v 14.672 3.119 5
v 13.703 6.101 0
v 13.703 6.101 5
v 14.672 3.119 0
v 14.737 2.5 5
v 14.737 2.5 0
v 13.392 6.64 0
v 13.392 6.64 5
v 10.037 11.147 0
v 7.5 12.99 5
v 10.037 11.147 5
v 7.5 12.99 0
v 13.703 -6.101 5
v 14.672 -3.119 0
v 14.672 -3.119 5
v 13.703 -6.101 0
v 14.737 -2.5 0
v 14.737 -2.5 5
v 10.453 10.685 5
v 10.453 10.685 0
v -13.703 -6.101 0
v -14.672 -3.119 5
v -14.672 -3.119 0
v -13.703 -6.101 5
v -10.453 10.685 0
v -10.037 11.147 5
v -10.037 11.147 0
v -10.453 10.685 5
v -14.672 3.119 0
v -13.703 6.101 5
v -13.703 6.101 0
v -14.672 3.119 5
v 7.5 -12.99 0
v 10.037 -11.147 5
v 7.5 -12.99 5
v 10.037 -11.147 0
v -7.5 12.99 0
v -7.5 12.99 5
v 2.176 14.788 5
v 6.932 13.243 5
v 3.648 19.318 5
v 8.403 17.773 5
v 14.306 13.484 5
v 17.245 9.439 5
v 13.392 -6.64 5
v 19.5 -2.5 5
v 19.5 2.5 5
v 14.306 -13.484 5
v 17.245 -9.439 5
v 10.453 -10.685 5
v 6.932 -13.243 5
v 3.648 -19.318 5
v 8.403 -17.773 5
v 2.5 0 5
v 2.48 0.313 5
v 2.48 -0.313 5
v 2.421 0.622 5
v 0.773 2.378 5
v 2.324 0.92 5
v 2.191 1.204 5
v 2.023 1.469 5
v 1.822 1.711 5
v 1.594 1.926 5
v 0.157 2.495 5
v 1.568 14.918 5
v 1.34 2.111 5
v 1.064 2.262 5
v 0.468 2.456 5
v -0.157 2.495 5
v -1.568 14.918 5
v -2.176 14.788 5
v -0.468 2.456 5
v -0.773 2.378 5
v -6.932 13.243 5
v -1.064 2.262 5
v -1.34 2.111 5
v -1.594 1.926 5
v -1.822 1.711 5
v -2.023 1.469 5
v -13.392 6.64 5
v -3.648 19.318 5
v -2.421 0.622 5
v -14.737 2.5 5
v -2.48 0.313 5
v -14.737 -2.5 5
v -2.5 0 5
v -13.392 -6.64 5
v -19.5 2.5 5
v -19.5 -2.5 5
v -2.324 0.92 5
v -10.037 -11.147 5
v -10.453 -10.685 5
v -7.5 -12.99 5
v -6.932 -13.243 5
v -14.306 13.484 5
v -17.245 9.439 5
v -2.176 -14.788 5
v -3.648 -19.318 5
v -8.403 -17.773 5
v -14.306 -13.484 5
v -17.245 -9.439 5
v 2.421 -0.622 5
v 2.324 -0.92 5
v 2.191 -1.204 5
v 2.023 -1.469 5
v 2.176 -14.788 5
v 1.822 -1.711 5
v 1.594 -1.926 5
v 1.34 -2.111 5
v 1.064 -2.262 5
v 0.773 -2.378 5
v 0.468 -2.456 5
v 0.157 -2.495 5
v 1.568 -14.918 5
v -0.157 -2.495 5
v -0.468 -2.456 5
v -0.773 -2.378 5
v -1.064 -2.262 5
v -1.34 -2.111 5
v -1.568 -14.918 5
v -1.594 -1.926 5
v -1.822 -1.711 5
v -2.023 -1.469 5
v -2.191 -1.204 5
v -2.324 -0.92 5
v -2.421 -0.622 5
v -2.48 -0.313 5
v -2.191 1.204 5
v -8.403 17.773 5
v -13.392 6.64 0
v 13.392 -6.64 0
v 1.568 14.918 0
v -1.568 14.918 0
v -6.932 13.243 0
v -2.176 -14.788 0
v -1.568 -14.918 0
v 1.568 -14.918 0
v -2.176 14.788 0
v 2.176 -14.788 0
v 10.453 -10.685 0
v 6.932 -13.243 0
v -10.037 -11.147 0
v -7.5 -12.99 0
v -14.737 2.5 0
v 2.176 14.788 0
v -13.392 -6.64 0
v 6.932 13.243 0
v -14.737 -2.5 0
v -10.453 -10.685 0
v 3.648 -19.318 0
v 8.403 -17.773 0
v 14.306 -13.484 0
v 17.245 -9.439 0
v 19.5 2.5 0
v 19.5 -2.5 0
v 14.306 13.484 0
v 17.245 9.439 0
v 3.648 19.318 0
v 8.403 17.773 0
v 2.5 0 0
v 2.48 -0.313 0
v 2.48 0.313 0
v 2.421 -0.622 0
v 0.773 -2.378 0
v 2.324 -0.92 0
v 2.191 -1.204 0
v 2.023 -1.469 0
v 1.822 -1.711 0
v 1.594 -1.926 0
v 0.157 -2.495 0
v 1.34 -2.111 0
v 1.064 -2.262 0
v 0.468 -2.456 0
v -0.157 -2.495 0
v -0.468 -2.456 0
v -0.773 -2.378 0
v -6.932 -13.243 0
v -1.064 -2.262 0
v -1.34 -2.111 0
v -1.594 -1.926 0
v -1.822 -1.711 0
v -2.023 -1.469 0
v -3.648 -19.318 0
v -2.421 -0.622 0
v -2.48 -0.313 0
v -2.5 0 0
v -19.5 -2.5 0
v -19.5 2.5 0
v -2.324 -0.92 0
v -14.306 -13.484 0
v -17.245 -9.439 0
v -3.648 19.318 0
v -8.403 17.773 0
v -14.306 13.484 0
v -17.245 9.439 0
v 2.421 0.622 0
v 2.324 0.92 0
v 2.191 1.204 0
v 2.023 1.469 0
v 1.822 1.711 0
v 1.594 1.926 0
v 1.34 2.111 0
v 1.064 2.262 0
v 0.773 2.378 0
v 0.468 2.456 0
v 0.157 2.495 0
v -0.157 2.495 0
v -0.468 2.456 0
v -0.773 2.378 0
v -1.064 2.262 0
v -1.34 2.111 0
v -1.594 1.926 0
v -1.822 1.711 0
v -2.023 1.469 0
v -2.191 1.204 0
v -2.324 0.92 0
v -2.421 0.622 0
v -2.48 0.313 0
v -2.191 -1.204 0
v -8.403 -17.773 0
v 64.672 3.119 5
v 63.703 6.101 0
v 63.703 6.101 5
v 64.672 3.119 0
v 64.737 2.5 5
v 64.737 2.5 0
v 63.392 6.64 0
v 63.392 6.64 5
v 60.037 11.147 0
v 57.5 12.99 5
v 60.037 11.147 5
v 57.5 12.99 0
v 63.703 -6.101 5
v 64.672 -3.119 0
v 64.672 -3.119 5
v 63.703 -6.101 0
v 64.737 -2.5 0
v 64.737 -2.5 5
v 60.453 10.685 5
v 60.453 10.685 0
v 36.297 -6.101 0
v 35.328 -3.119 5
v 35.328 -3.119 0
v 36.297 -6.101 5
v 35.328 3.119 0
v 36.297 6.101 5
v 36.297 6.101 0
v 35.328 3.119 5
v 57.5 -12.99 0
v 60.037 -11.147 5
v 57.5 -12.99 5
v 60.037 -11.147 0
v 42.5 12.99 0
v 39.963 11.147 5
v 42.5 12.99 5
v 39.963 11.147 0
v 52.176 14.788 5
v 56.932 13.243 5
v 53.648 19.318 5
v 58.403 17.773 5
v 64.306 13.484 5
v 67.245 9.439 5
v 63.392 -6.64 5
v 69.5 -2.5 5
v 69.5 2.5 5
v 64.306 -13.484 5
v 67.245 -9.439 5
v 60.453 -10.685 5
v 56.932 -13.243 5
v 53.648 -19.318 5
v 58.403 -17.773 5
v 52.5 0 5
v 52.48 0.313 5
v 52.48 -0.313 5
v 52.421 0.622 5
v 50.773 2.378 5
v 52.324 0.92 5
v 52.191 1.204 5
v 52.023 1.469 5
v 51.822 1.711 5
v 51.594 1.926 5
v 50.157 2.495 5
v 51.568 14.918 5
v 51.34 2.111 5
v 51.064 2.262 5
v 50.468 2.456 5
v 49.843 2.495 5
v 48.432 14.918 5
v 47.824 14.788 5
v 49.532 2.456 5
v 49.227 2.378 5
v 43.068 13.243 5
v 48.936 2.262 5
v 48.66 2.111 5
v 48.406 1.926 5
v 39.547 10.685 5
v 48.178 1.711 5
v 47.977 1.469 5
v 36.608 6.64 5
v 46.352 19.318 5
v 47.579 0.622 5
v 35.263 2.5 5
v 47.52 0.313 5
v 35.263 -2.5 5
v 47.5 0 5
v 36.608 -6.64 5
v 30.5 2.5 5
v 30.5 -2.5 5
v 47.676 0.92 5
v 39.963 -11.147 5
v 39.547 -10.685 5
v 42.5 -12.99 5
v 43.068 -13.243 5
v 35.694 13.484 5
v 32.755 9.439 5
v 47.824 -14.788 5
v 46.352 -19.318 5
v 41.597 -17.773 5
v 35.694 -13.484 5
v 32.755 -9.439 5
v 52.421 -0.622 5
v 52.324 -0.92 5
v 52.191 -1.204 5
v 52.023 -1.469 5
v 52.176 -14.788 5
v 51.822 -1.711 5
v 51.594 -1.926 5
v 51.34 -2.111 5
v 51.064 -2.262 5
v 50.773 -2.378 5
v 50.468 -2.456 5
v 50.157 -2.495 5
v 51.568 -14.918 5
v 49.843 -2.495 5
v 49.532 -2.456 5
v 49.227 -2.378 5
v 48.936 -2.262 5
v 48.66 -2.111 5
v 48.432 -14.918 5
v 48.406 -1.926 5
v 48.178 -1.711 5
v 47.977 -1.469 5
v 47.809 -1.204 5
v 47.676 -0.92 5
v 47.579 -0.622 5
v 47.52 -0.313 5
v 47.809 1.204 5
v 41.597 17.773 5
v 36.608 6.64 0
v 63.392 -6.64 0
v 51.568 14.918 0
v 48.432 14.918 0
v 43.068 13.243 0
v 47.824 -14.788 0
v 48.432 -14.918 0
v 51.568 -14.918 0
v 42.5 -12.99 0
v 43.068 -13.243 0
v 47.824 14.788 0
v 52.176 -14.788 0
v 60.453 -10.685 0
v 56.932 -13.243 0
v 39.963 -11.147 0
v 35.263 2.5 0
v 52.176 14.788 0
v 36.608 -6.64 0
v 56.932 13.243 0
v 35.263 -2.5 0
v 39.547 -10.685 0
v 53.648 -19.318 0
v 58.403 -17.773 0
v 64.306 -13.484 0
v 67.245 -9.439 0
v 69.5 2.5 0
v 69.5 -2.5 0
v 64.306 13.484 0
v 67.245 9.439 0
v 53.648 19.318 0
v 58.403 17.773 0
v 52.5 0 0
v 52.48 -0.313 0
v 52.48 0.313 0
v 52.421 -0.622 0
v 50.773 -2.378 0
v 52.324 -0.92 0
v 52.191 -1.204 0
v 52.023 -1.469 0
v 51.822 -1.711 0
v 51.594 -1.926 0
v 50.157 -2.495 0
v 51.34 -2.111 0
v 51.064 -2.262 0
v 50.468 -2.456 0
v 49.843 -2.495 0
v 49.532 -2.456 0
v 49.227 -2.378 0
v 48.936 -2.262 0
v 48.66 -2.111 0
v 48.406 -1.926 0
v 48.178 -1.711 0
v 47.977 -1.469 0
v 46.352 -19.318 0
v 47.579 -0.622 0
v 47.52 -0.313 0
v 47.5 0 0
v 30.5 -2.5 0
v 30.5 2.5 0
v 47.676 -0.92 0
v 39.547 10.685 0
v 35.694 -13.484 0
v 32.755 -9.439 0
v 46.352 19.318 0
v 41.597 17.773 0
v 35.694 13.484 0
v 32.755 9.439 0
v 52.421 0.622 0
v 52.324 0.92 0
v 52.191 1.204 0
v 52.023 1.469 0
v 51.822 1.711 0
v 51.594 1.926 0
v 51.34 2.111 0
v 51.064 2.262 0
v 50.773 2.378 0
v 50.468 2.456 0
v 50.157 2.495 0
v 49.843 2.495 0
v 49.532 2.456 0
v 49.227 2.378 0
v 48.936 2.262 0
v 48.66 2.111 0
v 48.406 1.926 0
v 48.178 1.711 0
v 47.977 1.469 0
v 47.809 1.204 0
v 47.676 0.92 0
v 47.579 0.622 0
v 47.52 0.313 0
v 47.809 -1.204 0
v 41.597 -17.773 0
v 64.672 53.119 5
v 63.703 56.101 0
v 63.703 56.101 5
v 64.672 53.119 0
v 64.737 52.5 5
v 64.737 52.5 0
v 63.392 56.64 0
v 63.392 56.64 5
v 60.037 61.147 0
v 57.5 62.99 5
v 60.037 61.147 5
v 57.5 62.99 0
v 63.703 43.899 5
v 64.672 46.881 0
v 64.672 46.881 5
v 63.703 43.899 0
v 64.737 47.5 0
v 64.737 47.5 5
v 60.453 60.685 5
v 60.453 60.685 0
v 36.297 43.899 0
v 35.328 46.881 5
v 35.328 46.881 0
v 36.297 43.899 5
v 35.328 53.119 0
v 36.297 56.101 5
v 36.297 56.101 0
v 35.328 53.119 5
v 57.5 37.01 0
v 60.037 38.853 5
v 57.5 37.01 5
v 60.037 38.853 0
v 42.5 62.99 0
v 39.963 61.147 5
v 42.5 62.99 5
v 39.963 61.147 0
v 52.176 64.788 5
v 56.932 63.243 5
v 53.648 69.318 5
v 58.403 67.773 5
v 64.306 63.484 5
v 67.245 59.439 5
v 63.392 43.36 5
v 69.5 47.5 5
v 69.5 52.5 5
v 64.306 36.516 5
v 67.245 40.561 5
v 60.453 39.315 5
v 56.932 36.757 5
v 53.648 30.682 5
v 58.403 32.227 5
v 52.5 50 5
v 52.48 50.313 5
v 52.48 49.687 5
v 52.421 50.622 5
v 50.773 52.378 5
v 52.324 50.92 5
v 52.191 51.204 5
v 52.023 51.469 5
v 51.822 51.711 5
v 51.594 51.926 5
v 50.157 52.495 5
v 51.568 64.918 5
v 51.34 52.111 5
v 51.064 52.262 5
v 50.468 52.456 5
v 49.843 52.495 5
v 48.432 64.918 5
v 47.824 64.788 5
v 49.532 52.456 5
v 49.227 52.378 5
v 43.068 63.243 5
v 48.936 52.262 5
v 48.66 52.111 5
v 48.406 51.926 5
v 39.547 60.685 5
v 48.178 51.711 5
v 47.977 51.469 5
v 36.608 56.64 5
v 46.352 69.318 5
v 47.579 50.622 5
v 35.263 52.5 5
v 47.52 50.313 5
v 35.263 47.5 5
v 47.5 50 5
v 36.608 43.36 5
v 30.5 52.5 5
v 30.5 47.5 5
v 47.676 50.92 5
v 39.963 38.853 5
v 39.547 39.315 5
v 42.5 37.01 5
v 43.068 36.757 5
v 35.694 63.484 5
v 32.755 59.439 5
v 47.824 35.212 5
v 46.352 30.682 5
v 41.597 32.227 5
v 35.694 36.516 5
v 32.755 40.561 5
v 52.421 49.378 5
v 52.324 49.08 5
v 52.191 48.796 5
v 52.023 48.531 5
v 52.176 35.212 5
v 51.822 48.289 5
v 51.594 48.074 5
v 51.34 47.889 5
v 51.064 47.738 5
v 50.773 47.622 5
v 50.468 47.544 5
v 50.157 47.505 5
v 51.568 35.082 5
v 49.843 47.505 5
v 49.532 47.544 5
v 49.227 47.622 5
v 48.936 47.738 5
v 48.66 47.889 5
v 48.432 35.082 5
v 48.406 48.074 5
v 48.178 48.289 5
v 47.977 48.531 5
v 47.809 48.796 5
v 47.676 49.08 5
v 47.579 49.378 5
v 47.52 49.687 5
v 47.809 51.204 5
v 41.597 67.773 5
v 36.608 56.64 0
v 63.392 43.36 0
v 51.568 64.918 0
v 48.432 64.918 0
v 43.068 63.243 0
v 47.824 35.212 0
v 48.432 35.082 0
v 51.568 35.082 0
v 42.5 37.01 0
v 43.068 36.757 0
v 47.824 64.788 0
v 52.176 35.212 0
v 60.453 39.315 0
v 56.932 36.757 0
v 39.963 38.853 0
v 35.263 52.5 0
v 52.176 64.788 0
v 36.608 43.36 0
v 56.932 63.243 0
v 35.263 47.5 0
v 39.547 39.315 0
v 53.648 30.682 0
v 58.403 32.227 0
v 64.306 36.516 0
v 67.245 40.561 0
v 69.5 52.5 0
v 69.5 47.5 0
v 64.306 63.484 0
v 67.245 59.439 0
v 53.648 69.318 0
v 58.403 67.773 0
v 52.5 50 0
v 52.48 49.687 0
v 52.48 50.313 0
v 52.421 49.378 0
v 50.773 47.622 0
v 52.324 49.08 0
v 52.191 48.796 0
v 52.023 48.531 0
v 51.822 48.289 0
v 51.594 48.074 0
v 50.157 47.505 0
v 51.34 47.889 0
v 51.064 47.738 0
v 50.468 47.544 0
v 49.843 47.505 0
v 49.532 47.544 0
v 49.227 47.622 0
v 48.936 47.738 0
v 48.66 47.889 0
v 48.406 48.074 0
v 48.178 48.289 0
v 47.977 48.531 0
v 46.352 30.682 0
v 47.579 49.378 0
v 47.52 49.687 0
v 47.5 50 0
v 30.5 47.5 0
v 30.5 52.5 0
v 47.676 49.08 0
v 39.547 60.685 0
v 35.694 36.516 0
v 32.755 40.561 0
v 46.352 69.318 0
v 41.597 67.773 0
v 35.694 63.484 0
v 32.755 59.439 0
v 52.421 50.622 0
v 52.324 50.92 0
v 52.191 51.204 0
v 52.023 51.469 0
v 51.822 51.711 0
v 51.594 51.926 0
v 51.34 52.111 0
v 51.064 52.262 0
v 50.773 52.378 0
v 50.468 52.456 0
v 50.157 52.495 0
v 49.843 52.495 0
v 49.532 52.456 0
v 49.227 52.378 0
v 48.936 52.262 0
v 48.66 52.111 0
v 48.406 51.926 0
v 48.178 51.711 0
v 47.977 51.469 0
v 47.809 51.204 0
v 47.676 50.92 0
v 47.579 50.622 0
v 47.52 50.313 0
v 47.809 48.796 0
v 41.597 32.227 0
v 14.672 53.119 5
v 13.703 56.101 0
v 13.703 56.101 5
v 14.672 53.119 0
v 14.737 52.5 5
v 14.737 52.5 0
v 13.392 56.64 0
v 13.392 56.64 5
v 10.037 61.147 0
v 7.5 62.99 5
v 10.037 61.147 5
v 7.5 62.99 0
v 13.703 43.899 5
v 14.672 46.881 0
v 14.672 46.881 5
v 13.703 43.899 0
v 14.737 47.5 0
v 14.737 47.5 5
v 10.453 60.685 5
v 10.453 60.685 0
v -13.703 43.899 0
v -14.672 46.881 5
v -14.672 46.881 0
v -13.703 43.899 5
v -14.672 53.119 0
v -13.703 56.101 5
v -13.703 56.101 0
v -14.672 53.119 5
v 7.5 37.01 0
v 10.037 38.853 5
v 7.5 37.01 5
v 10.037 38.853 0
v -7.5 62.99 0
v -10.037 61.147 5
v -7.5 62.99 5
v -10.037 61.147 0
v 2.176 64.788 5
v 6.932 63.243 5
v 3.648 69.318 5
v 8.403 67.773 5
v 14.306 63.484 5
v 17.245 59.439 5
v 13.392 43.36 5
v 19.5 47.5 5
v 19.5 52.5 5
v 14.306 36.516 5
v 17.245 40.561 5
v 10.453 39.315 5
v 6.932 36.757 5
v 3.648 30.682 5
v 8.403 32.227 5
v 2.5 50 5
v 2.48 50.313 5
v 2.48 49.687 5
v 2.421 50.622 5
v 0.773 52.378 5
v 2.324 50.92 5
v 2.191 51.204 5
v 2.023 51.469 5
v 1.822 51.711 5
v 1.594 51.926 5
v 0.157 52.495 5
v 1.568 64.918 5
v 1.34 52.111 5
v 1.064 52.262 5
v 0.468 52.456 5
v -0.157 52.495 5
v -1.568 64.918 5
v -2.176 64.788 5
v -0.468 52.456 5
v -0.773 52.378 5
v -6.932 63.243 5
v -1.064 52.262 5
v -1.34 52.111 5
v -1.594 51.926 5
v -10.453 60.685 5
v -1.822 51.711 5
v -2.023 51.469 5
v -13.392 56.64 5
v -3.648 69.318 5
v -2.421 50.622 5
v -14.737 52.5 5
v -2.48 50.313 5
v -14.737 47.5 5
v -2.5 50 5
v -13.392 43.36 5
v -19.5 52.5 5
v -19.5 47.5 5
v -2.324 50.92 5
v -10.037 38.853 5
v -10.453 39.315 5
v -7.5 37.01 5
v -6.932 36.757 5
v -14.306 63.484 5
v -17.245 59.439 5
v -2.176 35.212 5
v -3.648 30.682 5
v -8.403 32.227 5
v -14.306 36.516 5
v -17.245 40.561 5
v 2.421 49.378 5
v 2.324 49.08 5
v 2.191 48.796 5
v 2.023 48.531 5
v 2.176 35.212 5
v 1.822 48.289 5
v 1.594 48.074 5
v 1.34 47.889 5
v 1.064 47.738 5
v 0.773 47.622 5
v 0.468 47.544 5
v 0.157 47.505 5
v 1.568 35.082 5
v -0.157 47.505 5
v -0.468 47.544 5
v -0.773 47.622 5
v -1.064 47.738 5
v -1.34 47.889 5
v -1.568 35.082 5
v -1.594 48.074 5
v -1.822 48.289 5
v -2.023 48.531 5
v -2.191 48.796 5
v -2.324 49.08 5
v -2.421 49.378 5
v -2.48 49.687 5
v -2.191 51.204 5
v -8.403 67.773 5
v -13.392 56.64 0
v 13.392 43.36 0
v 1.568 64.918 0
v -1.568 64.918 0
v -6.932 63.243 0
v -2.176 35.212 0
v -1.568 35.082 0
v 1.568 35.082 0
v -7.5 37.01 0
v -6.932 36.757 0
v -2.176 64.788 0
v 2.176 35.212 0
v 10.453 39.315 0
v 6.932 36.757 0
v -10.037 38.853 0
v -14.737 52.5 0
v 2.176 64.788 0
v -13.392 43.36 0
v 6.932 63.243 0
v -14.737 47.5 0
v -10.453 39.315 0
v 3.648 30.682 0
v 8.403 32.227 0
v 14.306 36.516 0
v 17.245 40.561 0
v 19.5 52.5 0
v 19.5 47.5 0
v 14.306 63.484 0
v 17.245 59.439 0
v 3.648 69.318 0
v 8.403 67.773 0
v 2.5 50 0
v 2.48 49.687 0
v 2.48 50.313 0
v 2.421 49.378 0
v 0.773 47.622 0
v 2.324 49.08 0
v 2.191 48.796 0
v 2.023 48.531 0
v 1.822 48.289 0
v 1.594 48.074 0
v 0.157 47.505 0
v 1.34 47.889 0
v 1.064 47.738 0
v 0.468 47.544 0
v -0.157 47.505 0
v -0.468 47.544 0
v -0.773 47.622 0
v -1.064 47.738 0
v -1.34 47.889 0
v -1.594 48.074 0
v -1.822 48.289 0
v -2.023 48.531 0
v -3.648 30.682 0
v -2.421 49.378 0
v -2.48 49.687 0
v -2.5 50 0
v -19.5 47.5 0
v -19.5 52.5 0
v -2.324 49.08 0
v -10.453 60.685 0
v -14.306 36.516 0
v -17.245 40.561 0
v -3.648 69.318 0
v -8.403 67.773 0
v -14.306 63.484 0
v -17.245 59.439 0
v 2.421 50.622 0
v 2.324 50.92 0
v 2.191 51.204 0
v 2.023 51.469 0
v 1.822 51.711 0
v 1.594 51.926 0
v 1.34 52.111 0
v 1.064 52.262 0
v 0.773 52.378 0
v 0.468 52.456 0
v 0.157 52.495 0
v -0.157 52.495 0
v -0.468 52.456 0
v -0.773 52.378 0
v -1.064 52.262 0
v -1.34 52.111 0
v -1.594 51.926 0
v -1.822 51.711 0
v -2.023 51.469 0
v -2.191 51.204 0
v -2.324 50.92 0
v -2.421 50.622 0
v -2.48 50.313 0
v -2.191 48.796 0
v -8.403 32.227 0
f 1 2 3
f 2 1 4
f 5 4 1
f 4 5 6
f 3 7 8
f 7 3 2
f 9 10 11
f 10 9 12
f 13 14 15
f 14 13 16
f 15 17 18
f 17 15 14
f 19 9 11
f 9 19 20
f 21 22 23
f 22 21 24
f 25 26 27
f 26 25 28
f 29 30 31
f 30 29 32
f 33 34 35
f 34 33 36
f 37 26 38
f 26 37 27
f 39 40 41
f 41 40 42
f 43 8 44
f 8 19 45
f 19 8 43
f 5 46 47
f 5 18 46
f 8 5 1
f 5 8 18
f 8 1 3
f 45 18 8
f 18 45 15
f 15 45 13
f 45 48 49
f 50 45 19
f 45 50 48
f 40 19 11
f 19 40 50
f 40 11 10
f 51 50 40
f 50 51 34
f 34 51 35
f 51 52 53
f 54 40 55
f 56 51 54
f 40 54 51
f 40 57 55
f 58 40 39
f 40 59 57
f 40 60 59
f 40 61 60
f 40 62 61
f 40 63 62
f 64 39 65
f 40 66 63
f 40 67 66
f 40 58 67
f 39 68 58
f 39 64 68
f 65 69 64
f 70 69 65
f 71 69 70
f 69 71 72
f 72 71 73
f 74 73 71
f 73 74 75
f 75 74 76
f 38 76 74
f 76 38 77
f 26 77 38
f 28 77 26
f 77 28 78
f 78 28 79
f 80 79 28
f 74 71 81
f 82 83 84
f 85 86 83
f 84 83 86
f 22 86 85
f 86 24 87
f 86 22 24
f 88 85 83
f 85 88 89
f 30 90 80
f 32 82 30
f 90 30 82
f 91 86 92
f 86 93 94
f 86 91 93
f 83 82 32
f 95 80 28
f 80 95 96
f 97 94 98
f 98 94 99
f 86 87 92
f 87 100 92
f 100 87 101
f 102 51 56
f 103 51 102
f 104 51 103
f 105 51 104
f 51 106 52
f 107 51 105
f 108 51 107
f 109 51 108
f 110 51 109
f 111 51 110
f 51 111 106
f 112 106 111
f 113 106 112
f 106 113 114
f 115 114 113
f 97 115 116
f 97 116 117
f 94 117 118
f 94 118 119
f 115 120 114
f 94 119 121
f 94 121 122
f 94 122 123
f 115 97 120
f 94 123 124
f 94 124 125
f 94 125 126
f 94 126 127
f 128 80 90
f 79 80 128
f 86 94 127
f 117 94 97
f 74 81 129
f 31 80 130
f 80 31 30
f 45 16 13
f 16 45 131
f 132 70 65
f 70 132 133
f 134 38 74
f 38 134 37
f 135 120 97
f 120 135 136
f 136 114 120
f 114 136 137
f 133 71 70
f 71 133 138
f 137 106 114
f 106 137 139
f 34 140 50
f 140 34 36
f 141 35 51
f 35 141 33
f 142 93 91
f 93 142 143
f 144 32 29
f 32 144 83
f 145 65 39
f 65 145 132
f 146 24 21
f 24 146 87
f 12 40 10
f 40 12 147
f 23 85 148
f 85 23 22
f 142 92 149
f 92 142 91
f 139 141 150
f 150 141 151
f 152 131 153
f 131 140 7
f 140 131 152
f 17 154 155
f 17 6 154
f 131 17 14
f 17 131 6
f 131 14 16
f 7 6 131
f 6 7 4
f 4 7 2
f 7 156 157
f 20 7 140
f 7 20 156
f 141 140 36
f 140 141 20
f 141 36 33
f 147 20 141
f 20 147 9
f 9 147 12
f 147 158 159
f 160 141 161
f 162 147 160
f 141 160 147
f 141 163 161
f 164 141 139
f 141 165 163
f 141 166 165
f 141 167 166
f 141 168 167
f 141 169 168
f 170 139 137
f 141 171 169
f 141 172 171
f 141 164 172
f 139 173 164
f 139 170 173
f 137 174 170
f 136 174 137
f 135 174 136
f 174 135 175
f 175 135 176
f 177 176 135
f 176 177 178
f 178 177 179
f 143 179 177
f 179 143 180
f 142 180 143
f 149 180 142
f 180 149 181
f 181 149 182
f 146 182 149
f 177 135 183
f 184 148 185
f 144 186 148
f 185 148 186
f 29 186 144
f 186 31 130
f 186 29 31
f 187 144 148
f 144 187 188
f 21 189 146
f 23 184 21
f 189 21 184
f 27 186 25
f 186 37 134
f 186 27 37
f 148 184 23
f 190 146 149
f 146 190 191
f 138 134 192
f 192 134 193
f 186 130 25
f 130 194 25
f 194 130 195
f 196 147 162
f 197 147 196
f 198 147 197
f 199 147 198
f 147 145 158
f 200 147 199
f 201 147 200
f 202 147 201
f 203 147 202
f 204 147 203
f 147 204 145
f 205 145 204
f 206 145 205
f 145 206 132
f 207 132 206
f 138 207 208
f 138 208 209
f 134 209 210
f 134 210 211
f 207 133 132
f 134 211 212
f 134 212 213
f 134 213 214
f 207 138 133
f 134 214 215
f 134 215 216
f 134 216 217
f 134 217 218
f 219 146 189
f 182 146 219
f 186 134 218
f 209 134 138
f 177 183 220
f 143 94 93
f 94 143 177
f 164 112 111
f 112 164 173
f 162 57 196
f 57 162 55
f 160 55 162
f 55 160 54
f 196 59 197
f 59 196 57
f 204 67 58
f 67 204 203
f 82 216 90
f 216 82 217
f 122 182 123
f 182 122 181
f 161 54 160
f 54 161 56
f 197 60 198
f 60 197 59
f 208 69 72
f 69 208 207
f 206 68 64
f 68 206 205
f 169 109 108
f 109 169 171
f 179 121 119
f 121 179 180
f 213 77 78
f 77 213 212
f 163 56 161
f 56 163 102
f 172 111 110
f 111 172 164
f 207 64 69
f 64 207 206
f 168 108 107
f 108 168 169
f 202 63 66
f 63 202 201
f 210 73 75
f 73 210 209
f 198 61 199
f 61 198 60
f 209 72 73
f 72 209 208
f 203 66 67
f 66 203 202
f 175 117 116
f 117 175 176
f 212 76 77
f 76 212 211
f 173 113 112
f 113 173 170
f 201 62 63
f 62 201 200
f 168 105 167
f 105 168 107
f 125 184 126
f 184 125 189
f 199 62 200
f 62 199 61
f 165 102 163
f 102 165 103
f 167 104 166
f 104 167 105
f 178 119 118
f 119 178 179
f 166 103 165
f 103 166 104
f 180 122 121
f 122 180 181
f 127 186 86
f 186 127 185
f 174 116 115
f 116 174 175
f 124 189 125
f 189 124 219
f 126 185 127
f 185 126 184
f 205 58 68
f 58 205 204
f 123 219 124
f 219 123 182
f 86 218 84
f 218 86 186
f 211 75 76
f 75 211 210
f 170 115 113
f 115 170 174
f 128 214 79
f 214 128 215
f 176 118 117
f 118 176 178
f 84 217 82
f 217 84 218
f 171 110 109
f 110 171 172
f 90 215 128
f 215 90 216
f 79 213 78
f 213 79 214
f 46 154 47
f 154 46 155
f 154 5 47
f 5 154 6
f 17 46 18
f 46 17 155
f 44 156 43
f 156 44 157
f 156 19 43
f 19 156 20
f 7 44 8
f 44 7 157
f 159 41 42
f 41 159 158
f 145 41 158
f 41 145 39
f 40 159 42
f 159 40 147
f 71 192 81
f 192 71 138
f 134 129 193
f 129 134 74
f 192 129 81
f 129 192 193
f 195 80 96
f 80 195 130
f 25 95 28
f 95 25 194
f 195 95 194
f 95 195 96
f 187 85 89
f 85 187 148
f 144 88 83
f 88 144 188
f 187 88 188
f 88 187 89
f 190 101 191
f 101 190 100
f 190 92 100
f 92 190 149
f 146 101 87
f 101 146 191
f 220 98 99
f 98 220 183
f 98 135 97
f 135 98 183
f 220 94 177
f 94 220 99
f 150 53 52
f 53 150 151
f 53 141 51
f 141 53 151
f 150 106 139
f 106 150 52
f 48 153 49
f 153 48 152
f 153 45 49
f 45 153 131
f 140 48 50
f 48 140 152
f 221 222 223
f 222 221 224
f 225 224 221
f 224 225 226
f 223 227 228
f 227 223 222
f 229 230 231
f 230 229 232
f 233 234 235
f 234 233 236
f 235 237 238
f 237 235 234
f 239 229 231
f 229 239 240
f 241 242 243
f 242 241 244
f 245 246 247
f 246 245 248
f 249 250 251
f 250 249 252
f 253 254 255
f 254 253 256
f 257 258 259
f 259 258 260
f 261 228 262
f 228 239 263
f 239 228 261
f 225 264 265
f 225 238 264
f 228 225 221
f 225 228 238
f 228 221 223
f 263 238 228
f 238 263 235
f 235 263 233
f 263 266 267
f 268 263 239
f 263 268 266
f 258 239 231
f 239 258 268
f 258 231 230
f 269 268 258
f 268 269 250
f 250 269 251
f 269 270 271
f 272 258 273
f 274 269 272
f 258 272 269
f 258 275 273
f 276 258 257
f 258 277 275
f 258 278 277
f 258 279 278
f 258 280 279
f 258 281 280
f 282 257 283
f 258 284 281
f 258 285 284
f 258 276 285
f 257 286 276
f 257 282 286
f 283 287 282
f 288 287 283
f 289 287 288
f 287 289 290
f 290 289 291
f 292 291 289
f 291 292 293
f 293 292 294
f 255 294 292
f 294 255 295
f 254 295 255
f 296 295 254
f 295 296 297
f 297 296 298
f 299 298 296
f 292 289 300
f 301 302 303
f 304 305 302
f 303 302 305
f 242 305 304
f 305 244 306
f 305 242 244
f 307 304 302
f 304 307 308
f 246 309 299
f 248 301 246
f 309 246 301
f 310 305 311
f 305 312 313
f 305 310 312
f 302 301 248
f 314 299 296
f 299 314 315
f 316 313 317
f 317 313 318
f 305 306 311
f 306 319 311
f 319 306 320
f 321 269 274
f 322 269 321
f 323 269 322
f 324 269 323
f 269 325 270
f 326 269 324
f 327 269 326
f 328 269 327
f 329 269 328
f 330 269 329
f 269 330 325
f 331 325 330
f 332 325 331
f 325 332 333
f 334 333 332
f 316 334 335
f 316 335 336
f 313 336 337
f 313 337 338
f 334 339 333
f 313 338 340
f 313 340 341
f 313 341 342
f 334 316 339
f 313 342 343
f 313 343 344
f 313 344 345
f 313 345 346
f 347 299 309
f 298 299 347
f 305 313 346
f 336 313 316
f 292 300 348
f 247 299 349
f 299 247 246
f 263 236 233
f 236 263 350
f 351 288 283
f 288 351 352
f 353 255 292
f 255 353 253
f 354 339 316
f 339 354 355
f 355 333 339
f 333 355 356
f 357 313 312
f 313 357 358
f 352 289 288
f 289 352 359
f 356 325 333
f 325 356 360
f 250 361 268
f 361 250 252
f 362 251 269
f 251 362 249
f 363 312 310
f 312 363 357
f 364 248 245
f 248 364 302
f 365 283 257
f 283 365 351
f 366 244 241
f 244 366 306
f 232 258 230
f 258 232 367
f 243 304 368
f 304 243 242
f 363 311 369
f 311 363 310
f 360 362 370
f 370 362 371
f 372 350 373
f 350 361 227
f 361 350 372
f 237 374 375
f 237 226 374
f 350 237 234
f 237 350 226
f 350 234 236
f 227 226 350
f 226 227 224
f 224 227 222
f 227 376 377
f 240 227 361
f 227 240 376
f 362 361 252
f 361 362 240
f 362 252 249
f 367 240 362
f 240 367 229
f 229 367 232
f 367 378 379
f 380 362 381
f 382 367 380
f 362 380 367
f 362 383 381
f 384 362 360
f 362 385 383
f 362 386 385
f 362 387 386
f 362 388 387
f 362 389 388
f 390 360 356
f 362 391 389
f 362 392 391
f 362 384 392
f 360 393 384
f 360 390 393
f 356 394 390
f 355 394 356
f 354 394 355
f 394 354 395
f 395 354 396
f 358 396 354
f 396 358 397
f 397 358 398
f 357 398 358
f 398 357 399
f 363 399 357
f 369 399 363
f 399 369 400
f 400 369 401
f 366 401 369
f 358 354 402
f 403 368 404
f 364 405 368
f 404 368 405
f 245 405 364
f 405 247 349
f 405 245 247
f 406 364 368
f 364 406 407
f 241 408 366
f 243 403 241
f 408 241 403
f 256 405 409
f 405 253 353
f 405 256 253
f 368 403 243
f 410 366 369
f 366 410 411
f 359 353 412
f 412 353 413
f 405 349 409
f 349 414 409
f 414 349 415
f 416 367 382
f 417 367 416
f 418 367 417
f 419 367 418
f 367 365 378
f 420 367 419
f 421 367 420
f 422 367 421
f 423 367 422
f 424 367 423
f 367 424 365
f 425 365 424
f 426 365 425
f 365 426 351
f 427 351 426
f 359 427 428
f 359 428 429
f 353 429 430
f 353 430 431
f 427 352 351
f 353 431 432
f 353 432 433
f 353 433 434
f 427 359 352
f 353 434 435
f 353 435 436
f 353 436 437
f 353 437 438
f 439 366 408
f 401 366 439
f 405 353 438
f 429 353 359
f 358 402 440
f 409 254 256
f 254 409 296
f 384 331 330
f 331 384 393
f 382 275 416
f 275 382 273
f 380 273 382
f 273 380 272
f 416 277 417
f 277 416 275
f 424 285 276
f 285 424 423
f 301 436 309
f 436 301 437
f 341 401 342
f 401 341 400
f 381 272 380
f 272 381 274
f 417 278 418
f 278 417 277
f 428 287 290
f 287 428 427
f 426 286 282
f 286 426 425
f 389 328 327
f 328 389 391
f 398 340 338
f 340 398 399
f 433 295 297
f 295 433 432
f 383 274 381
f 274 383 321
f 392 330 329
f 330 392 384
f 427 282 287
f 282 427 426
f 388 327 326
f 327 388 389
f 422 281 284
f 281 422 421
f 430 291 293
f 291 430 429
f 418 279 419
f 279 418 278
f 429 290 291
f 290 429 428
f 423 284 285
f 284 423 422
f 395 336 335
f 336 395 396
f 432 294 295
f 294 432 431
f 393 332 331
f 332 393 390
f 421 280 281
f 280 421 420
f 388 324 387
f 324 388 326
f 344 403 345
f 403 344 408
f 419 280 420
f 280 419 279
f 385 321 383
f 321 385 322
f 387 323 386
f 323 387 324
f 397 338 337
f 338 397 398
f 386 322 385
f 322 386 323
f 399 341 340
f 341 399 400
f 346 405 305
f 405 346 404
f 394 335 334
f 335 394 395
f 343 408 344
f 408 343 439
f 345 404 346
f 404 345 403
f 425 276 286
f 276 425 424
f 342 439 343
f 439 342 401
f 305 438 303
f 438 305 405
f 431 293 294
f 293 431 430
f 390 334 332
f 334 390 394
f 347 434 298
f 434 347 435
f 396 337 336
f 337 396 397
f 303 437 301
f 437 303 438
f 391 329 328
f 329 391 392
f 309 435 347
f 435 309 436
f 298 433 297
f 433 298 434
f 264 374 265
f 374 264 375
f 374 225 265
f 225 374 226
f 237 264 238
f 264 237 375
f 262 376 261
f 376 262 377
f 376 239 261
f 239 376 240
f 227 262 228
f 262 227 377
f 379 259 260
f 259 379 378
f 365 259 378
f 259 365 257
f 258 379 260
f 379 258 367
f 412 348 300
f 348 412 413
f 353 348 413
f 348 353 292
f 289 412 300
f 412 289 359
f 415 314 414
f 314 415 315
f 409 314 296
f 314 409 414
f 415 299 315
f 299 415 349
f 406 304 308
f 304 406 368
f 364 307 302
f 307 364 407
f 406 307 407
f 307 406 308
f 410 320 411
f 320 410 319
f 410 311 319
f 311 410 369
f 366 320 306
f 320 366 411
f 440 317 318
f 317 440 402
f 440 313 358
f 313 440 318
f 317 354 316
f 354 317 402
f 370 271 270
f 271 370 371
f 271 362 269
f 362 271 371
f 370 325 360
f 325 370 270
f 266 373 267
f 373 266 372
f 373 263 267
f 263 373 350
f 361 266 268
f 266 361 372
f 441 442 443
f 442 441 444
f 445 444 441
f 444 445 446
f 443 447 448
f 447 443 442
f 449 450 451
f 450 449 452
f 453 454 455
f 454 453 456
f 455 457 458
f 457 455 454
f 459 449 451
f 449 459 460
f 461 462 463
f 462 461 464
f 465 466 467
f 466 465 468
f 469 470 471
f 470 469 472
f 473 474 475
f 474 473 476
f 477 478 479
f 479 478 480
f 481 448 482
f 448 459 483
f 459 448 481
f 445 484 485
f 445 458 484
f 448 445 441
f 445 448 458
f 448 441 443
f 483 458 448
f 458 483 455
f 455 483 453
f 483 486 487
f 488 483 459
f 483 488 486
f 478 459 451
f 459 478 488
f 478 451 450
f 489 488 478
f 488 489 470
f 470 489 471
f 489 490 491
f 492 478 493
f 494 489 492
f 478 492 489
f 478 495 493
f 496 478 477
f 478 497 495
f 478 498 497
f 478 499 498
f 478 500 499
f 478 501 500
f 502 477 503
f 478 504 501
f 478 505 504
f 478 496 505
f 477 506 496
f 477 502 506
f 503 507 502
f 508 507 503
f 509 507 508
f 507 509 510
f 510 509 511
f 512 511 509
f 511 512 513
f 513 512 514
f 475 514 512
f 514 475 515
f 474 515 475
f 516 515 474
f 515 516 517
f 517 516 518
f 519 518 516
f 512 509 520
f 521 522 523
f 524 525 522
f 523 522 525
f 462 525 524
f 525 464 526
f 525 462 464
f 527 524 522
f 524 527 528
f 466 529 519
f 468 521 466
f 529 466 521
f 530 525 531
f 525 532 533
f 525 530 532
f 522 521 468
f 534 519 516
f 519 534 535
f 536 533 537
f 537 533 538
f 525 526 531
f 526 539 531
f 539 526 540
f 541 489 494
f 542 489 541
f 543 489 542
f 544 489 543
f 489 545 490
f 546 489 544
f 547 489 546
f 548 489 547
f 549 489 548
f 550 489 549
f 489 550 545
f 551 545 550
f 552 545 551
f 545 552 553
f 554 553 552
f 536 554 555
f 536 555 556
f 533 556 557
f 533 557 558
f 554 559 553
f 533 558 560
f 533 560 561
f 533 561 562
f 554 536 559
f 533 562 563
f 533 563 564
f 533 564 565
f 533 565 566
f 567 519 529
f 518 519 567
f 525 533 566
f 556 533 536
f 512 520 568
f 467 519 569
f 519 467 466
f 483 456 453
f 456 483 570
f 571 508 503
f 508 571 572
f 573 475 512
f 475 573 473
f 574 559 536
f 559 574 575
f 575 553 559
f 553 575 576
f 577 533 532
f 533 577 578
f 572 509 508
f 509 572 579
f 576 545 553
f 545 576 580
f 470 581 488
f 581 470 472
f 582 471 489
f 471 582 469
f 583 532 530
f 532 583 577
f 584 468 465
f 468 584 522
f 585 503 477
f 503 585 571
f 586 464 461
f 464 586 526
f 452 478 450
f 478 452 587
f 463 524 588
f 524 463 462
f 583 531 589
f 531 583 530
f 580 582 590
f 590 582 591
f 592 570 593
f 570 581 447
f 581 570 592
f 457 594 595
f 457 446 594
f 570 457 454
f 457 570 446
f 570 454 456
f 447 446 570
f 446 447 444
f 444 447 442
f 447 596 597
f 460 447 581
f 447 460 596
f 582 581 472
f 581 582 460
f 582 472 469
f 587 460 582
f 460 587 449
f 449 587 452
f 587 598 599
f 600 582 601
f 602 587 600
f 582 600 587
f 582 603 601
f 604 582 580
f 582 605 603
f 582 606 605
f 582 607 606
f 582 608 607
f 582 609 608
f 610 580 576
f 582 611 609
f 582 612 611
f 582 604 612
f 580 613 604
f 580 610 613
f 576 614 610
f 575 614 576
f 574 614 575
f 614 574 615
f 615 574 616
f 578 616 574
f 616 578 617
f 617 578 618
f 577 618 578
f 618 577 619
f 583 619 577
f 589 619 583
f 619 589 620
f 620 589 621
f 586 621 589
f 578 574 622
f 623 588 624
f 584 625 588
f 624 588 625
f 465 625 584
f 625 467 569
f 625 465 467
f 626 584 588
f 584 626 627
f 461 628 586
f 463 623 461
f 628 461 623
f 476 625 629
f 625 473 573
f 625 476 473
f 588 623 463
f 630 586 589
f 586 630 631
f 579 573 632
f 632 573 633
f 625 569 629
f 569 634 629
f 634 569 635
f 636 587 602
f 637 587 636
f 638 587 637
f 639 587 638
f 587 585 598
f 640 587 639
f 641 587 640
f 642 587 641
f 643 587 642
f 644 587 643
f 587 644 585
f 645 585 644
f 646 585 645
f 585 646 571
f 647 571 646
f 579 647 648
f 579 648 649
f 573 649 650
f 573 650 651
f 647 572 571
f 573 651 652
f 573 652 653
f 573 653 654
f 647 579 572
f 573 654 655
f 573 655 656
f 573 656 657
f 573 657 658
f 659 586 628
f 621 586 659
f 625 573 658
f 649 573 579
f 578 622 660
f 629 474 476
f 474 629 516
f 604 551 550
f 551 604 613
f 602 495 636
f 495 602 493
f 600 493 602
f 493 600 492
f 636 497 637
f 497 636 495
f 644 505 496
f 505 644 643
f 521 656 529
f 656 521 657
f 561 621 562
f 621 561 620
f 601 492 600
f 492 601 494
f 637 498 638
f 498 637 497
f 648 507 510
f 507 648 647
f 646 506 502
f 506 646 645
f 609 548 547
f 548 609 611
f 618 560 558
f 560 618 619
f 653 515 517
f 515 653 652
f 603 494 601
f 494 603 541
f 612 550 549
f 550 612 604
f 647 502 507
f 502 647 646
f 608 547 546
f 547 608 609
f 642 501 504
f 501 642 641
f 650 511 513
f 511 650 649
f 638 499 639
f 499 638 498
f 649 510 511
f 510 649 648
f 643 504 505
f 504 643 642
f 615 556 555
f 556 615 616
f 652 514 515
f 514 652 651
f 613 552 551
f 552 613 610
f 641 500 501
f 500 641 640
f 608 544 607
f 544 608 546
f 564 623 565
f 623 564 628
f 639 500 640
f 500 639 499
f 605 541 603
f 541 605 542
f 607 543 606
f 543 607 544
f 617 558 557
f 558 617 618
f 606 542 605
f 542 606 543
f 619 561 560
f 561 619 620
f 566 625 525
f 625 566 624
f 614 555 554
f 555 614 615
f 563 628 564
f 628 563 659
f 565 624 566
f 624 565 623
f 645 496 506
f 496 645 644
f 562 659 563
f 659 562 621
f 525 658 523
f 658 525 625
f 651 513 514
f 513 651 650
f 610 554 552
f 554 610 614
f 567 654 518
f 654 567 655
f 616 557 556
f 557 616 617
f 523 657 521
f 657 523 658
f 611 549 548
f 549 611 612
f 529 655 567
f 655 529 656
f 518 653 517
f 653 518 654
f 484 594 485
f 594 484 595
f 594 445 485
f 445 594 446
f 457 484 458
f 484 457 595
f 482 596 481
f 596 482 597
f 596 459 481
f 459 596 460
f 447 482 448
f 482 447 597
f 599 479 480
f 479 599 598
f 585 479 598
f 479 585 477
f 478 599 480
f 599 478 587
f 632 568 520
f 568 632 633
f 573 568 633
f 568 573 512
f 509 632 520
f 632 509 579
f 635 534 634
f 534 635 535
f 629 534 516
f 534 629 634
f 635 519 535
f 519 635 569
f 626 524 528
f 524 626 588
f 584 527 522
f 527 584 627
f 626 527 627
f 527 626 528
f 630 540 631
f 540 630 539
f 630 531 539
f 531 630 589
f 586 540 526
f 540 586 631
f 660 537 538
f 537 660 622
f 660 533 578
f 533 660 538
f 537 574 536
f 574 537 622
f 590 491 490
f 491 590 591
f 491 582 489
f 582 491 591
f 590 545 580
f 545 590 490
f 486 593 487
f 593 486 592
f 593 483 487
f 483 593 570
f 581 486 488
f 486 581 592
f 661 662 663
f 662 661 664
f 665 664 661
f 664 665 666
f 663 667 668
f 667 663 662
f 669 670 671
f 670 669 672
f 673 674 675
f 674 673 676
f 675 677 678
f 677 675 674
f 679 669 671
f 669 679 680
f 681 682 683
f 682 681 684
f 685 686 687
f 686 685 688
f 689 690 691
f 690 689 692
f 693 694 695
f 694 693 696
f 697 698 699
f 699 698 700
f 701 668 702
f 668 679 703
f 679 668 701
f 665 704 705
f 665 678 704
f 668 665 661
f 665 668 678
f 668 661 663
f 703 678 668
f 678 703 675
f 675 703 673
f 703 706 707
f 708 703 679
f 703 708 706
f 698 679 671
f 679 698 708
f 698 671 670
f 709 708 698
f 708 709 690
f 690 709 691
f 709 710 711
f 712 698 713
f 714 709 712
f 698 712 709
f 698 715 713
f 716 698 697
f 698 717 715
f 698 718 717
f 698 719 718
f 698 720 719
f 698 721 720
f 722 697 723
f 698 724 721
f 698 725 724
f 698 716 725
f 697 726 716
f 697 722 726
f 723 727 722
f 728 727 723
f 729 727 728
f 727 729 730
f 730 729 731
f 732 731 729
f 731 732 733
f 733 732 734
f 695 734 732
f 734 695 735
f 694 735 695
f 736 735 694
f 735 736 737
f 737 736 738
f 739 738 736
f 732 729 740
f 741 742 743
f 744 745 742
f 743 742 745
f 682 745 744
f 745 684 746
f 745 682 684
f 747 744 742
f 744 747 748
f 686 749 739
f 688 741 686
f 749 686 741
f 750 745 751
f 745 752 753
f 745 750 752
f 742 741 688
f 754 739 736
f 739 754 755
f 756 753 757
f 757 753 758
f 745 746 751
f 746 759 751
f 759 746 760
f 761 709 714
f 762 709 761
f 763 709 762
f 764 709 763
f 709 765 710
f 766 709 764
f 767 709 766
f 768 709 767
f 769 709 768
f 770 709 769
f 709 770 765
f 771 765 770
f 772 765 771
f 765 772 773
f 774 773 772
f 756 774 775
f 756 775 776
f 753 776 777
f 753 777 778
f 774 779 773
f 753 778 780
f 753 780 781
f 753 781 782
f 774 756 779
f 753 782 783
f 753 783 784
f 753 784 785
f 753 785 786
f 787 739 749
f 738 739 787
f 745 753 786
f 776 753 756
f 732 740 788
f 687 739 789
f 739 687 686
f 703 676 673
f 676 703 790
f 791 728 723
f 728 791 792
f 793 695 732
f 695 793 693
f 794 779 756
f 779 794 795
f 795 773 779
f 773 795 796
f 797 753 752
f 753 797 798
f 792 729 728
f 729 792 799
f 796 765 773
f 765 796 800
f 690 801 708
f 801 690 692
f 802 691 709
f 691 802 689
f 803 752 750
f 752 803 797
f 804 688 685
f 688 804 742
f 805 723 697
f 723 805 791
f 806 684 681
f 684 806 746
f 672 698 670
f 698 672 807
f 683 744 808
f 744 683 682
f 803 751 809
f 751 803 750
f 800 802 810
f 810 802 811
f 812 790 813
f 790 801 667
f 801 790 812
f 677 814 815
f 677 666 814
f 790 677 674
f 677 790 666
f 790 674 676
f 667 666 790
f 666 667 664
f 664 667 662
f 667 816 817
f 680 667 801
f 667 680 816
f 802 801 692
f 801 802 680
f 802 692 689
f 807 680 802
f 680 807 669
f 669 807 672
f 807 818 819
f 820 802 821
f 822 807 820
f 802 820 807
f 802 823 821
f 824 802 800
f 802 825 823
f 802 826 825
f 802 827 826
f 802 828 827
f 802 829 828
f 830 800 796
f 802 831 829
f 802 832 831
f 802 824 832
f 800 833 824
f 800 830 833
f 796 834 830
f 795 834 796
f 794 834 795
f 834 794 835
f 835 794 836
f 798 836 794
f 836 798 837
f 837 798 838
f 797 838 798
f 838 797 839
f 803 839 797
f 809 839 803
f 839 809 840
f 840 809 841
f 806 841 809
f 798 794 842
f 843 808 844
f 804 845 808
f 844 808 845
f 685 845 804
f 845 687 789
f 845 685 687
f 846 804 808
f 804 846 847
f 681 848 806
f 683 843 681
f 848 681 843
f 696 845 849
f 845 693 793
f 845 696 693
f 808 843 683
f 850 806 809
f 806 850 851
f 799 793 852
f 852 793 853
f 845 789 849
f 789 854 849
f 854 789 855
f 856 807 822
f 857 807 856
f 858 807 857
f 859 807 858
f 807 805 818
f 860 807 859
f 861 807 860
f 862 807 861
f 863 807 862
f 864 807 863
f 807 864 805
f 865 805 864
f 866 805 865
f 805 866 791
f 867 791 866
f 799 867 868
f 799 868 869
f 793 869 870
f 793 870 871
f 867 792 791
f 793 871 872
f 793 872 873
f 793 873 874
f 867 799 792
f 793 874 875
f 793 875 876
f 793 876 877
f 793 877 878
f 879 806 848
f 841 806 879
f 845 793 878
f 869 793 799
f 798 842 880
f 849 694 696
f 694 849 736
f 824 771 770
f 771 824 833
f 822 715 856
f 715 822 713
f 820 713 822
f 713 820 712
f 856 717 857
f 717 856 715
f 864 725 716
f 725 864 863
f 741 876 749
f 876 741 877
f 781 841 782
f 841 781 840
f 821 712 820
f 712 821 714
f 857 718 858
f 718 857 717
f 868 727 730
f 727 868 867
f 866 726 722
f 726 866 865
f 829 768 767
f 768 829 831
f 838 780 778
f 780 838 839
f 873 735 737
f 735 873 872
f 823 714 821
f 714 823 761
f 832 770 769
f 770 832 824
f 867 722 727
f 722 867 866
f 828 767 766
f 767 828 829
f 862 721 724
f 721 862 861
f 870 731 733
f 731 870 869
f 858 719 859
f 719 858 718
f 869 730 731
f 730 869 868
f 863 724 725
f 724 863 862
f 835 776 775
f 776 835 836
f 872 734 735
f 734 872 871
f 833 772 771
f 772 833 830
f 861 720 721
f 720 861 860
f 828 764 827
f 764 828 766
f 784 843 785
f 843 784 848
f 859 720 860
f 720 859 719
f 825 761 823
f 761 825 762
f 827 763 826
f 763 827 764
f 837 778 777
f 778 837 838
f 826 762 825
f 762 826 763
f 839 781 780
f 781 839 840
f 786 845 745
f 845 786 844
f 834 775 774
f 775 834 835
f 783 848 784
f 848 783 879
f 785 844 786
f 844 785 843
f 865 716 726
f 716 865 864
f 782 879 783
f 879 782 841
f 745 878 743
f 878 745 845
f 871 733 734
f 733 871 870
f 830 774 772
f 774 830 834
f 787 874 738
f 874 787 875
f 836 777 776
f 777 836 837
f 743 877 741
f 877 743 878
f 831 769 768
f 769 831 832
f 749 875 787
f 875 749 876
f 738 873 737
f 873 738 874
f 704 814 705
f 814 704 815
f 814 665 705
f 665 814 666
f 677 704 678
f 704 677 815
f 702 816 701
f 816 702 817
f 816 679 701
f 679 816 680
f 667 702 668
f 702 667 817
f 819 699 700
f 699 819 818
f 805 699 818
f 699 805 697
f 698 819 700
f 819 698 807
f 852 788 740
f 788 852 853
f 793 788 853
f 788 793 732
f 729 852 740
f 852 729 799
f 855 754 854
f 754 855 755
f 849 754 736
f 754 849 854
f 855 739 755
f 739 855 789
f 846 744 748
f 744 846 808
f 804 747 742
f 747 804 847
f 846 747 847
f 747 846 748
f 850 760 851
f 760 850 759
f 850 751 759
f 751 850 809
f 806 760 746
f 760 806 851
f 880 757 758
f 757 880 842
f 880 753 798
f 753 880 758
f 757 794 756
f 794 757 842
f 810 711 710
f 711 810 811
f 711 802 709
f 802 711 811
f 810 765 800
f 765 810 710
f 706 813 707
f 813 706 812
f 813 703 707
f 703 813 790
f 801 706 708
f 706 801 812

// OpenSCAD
diameter = 60;

//difference(){
//cylinder(h=5, d=diameter);
//cylinder (h=5, d = 5, $fn=50);
//}
//
//teeth = 18;
//
//for (i = [0 : teeth-1]){
//	rotate(i * 360 / teeth, [0, 0, 1])
//	translate([diameter/2 - .5, -2.5, 0])
//	cube(5);
//}


	teeth = 10;

	difference(){
		cylinder(h=5, d=30);
		cylinder (h=5, d = 5, $fn=50);
	}
	for (i = [0 : teeth-1]){
		rotate(i * 360 / teeth, [0, 0, 1])
		translate([30/2 - .5, -2.5, 0])
		cube(5);
	}

translate([50,0,0]){
	teeth = 10;

	difference(){
		cylinder(h=5, d=30);
		cylinder (h=5, d = 5, $fn=50);
	}
	for (i = [0 : teeth-1]){
		rotate(i * 360 / teeth, [0, 0, 1])
		translate([30/2 - .5, -2.5, 0])
		cube(5);
	}
}

translate([50,50,0]){
	teeth = 10;

	difference(){
		cylinder(h=5, d=30);
		cylinder (h=5, d = 5, $fn=50);
	}
	for (i = [0 : teeth-1]){
		rotate(i * 360 / teeth, [0, 0, 1])
		translate([30/2 - .5, -2.5, 0])
		cube(5);
	}
}

translate([0,50,0]){
	teeth = 10;

	difference(){
		cylinder(h=5, d=30);
		cylinder (h=5, d = 5, $fn=50);
	}
	for (i = [0 : teeth-1]){
		rotate(i * 360 / teeth, [0, 0, 1])
		translate([30/2 - .5, -2.5, 0])
		cube(5);
	}
}
